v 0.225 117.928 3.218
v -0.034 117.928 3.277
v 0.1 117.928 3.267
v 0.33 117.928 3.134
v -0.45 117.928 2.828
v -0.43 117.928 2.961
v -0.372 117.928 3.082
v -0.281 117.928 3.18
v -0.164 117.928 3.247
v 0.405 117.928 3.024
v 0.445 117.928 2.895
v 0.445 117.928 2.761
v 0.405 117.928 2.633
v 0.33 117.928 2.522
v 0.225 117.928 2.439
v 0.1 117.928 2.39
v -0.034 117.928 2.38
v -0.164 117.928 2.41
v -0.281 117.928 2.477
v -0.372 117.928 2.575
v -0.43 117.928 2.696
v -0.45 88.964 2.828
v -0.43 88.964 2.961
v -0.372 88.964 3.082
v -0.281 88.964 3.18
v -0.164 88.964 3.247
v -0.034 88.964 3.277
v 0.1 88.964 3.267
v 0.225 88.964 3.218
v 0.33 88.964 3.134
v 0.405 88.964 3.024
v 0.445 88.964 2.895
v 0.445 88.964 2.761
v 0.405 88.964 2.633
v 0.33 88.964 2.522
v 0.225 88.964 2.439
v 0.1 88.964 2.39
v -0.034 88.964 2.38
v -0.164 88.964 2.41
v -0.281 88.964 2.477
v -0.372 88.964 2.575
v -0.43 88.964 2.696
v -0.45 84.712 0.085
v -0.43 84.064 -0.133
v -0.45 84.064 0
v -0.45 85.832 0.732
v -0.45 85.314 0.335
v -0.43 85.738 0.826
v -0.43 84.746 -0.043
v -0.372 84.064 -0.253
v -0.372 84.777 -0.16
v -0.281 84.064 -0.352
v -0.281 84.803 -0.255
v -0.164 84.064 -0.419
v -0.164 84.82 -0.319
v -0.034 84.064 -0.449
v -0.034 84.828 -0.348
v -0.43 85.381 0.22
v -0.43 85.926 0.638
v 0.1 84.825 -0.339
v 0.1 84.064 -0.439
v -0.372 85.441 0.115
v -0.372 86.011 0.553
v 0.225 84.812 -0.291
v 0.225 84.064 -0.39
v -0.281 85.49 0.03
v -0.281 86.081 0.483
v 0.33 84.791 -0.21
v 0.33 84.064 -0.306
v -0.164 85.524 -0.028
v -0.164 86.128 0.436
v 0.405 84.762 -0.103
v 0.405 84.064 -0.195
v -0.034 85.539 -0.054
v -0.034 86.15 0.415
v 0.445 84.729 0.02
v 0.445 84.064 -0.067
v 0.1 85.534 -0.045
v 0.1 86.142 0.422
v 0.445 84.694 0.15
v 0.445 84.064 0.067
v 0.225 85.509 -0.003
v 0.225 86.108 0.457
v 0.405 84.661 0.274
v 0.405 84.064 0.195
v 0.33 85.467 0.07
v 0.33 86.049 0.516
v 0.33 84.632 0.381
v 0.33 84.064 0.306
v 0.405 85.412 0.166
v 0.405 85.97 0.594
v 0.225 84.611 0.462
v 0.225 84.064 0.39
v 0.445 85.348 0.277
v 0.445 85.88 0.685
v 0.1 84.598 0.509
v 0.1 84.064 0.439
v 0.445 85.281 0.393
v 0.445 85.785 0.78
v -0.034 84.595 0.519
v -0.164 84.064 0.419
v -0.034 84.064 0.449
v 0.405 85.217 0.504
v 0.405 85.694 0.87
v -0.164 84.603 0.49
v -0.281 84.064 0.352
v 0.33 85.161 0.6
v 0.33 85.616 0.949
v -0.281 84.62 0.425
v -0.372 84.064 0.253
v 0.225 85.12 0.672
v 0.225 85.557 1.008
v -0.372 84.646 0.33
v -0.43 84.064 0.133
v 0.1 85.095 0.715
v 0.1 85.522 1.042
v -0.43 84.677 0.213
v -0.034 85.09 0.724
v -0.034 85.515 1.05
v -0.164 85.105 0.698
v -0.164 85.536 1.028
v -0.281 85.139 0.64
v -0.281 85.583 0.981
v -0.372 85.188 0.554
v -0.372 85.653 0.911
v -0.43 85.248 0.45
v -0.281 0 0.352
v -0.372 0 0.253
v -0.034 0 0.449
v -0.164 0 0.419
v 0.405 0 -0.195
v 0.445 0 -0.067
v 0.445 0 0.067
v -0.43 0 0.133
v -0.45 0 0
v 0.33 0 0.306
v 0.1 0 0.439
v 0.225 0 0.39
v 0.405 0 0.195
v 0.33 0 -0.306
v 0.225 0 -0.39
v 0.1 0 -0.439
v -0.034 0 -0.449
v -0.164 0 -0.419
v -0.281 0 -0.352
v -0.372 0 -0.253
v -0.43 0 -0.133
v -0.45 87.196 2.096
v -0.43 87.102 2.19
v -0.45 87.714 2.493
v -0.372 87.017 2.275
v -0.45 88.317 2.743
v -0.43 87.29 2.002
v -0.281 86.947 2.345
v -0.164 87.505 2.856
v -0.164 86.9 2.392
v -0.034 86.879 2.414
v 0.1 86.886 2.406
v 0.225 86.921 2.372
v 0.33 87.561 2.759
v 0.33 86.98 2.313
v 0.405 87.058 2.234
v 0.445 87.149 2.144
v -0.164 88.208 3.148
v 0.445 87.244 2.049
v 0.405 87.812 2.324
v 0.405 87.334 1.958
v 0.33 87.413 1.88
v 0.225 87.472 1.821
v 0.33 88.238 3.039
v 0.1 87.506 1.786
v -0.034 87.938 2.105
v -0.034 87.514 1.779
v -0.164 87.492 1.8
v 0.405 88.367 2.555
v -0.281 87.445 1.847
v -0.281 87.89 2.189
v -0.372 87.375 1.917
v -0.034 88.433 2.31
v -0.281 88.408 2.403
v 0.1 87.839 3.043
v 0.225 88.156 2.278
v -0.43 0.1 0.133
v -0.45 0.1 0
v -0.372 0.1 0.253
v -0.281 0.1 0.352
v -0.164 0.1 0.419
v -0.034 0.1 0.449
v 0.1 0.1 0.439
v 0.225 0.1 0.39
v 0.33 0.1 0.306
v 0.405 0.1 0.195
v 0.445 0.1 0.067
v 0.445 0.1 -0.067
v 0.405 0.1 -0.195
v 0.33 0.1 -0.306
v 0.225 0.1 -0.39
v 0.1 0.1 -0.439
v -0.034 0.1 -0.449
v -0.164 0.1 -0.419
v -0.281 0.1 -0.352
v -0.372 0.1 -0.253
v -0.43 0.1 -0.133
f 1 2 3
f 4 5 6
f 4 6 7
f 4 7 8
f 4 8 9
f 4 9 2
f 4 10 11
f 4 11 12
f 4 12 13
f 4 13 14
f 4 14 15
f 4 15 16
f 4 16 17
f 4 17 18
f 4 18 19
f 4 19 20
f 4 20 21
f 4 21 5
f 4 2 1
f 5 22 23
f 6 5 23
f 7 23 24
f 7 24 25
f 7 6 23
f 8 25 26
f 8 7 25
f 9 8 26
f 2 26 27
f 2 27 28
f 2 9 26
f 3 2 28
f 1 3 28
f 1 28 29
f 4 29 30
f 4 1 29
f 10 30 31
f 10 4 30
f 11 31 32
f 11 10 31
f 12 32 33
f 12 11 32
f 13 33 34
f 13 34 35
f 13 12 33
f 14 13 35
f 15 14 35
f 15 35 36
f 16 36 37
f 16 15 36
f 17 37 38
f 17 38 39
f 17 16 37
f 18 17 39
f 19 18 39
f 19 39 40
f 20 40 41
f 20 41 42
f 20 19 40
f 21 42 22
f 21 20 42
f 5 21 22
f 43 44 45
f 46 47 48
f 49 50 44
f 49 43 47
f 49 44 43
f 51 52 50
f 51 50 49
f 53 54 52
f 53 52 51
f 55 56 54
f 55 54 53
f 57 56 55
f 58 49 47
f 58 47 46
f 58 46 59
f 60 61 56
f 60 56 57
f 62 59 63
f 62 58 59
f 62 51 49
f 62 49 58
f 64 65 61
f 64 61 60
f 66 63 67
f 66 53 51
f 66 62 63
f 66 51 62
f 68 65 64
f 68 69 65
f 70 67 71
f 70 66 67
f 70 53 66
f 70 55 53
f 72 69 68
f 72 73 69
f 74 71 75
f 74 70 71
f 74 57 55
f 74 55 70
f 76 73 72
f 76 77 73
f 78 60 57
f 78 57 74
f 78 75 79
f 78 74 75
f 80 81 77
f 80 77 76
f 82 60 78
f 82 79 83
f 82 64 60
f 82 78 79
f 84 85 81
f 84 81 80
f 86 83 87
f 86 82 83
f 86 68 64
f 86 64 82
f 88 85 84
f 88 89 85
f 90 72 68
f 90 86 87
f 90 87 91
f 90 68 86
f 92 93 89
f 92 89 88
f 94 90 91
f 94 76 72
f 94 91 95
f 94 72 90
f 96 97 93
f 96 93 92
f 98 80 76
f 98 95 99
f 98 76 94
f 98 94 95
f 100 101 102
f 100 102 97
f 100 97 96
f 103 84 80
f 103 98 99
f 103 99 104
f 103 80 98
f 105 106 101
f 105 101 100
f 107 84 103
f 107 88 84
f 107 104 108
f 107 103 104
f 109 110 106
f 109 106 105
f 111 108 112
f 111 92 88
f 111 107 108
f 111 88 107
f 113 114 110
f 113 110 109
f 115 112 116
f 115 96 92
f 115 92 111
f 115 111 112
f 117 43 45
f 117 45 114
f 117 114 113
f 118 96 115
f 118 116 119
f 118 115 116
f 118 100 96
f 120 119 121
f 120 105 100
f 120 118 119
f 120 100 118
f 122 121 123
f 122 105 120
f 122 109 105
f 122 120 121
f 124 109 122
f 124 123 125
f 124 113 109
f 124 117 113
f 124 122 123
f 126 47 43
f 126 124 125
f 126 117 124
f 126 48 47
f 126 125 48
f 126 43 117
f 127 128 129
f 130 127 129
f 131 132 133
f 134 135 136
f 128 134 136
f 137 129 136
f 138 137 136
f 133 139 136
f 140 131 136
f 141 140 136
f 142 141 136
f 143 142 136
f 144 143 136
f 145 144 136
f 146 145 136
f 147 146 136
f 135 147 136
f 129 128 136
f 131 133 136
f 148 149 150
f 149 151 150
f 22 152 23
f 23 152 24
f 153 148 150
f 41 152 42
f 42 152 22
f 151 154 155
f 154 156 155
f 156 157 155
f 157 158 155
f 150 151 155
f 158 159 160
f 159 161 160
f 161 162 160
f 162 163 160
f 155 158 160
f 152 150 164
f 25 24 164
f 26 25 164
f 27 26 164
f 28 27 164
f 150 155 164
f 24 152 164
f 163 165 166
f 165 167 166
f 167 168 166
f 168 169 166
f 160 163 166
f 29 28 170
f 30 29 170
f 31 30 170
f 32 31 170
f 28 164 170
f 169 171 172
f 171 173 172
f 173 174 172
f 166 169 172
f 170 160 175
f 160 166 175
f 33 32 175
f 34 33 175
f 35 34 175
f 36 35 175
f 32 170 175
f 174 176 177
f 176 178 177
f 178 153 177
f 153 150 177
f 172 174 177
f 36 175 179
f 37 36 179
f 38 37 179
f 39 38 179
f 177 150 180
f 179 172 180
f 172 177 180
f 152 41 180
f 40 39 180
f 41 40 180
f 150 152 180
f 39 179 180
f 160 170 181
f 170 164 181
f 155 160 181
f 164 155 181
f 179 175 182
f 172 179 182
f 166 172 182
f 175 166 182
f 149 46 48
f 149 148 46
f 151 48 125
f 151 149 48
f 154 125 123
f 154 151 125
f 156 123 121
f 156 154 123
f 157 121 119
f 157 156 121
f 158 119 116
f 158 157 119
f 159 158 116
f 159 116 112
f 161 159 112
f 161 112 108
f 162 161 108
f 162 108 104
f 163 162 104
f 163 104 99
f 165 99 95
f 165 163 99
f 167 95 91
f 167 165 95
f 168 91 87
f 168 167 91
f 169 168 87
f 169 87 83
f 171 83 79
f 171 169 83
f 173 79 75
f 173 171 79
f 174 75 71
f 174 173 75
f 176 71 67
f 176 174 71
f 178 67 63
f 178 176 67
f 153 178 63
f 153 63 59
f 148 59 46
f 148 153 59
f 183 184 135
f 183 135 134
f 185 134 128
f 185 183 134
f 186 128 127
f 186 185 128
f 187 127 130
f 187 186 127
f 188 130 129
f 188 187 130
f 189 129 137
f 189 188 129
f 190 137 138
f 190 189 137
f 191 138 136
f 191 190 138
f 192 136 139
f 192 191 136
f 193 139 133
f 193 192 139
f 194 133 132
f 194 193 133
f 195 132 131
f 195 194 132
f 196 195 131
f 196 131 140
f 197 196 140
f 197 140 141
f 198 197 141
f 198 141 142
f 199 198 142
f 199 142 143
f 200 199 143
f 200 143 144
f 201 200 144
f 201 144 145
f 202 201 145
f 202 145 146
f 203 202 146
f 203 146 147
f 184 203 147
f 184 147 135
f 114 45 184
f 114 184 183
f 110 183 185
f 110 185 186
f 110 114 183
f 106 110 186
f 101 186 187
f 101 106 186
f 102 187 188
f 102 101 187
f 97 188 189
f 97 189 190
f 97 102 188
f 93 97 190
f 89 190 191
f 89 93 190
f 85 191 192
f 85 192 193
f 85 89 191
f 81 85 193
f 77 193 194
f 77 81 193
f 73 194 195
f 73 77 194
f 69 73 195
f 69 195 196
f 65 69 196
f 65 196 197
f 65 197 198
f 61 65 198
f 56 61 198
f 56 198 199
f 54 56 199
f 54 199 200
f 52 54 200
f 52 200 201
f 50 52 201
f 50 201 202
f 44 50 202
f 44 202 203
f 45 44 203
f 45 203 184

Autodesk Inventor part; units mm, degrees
ref_plane "YZ Plane" through (0, 0, 0) normal (1, 0, 0) x (0, 1, 0)
ref_plane "XZ Plane" through (0, 0, 0) normal (0, 1, 0) x (-1, 0, 0)
ref_plane "XY Plane" through (0, 0, 0) normal (0, 0, 1) x (1, 0, 0)
sketch "Sketch1" plane through (0, 0, 0) normal (0, 1, 0) x (-1, 0, 0)
  circle A0 centre (0, 0) radius 0.45
  dimension "d0" = 0.9
sketch "Sketch2" plane through (0, 0, 0) normal (1, 0, 0) x (0, 1, 0)
  line L0 (0, 0) -> (0.1, 0)
  line L1 (0.1, 0) -> (84.0645, 0)
  line L2 (85.8322, 0.7322) -> (87.1962, 2.0962)
  line L3 (88.964, 2.8284) -> (117.9284, 2.8284)
  arc A0 (88.964, 2.8284) -> (87.1962, 2.0962) centre (88.964, 0.3284) ccw
  arc A1 (84.0645, 0) -> (85.8322, 0.7322) centre (84.0645, 2.5) ccw
  point P0 (85.1, 0)
  point P1 (87.9284, 2.8284)
  dimension "d1" = 0.1
  dimension "d4" = 85
  dimension "d6" = 4
  dimension "d7" = 30
  dimension "d8" = 2.5
sweep "Sweep2" add profiles "Sketch1" path "Sketch2"
properties part number "cable anular"
